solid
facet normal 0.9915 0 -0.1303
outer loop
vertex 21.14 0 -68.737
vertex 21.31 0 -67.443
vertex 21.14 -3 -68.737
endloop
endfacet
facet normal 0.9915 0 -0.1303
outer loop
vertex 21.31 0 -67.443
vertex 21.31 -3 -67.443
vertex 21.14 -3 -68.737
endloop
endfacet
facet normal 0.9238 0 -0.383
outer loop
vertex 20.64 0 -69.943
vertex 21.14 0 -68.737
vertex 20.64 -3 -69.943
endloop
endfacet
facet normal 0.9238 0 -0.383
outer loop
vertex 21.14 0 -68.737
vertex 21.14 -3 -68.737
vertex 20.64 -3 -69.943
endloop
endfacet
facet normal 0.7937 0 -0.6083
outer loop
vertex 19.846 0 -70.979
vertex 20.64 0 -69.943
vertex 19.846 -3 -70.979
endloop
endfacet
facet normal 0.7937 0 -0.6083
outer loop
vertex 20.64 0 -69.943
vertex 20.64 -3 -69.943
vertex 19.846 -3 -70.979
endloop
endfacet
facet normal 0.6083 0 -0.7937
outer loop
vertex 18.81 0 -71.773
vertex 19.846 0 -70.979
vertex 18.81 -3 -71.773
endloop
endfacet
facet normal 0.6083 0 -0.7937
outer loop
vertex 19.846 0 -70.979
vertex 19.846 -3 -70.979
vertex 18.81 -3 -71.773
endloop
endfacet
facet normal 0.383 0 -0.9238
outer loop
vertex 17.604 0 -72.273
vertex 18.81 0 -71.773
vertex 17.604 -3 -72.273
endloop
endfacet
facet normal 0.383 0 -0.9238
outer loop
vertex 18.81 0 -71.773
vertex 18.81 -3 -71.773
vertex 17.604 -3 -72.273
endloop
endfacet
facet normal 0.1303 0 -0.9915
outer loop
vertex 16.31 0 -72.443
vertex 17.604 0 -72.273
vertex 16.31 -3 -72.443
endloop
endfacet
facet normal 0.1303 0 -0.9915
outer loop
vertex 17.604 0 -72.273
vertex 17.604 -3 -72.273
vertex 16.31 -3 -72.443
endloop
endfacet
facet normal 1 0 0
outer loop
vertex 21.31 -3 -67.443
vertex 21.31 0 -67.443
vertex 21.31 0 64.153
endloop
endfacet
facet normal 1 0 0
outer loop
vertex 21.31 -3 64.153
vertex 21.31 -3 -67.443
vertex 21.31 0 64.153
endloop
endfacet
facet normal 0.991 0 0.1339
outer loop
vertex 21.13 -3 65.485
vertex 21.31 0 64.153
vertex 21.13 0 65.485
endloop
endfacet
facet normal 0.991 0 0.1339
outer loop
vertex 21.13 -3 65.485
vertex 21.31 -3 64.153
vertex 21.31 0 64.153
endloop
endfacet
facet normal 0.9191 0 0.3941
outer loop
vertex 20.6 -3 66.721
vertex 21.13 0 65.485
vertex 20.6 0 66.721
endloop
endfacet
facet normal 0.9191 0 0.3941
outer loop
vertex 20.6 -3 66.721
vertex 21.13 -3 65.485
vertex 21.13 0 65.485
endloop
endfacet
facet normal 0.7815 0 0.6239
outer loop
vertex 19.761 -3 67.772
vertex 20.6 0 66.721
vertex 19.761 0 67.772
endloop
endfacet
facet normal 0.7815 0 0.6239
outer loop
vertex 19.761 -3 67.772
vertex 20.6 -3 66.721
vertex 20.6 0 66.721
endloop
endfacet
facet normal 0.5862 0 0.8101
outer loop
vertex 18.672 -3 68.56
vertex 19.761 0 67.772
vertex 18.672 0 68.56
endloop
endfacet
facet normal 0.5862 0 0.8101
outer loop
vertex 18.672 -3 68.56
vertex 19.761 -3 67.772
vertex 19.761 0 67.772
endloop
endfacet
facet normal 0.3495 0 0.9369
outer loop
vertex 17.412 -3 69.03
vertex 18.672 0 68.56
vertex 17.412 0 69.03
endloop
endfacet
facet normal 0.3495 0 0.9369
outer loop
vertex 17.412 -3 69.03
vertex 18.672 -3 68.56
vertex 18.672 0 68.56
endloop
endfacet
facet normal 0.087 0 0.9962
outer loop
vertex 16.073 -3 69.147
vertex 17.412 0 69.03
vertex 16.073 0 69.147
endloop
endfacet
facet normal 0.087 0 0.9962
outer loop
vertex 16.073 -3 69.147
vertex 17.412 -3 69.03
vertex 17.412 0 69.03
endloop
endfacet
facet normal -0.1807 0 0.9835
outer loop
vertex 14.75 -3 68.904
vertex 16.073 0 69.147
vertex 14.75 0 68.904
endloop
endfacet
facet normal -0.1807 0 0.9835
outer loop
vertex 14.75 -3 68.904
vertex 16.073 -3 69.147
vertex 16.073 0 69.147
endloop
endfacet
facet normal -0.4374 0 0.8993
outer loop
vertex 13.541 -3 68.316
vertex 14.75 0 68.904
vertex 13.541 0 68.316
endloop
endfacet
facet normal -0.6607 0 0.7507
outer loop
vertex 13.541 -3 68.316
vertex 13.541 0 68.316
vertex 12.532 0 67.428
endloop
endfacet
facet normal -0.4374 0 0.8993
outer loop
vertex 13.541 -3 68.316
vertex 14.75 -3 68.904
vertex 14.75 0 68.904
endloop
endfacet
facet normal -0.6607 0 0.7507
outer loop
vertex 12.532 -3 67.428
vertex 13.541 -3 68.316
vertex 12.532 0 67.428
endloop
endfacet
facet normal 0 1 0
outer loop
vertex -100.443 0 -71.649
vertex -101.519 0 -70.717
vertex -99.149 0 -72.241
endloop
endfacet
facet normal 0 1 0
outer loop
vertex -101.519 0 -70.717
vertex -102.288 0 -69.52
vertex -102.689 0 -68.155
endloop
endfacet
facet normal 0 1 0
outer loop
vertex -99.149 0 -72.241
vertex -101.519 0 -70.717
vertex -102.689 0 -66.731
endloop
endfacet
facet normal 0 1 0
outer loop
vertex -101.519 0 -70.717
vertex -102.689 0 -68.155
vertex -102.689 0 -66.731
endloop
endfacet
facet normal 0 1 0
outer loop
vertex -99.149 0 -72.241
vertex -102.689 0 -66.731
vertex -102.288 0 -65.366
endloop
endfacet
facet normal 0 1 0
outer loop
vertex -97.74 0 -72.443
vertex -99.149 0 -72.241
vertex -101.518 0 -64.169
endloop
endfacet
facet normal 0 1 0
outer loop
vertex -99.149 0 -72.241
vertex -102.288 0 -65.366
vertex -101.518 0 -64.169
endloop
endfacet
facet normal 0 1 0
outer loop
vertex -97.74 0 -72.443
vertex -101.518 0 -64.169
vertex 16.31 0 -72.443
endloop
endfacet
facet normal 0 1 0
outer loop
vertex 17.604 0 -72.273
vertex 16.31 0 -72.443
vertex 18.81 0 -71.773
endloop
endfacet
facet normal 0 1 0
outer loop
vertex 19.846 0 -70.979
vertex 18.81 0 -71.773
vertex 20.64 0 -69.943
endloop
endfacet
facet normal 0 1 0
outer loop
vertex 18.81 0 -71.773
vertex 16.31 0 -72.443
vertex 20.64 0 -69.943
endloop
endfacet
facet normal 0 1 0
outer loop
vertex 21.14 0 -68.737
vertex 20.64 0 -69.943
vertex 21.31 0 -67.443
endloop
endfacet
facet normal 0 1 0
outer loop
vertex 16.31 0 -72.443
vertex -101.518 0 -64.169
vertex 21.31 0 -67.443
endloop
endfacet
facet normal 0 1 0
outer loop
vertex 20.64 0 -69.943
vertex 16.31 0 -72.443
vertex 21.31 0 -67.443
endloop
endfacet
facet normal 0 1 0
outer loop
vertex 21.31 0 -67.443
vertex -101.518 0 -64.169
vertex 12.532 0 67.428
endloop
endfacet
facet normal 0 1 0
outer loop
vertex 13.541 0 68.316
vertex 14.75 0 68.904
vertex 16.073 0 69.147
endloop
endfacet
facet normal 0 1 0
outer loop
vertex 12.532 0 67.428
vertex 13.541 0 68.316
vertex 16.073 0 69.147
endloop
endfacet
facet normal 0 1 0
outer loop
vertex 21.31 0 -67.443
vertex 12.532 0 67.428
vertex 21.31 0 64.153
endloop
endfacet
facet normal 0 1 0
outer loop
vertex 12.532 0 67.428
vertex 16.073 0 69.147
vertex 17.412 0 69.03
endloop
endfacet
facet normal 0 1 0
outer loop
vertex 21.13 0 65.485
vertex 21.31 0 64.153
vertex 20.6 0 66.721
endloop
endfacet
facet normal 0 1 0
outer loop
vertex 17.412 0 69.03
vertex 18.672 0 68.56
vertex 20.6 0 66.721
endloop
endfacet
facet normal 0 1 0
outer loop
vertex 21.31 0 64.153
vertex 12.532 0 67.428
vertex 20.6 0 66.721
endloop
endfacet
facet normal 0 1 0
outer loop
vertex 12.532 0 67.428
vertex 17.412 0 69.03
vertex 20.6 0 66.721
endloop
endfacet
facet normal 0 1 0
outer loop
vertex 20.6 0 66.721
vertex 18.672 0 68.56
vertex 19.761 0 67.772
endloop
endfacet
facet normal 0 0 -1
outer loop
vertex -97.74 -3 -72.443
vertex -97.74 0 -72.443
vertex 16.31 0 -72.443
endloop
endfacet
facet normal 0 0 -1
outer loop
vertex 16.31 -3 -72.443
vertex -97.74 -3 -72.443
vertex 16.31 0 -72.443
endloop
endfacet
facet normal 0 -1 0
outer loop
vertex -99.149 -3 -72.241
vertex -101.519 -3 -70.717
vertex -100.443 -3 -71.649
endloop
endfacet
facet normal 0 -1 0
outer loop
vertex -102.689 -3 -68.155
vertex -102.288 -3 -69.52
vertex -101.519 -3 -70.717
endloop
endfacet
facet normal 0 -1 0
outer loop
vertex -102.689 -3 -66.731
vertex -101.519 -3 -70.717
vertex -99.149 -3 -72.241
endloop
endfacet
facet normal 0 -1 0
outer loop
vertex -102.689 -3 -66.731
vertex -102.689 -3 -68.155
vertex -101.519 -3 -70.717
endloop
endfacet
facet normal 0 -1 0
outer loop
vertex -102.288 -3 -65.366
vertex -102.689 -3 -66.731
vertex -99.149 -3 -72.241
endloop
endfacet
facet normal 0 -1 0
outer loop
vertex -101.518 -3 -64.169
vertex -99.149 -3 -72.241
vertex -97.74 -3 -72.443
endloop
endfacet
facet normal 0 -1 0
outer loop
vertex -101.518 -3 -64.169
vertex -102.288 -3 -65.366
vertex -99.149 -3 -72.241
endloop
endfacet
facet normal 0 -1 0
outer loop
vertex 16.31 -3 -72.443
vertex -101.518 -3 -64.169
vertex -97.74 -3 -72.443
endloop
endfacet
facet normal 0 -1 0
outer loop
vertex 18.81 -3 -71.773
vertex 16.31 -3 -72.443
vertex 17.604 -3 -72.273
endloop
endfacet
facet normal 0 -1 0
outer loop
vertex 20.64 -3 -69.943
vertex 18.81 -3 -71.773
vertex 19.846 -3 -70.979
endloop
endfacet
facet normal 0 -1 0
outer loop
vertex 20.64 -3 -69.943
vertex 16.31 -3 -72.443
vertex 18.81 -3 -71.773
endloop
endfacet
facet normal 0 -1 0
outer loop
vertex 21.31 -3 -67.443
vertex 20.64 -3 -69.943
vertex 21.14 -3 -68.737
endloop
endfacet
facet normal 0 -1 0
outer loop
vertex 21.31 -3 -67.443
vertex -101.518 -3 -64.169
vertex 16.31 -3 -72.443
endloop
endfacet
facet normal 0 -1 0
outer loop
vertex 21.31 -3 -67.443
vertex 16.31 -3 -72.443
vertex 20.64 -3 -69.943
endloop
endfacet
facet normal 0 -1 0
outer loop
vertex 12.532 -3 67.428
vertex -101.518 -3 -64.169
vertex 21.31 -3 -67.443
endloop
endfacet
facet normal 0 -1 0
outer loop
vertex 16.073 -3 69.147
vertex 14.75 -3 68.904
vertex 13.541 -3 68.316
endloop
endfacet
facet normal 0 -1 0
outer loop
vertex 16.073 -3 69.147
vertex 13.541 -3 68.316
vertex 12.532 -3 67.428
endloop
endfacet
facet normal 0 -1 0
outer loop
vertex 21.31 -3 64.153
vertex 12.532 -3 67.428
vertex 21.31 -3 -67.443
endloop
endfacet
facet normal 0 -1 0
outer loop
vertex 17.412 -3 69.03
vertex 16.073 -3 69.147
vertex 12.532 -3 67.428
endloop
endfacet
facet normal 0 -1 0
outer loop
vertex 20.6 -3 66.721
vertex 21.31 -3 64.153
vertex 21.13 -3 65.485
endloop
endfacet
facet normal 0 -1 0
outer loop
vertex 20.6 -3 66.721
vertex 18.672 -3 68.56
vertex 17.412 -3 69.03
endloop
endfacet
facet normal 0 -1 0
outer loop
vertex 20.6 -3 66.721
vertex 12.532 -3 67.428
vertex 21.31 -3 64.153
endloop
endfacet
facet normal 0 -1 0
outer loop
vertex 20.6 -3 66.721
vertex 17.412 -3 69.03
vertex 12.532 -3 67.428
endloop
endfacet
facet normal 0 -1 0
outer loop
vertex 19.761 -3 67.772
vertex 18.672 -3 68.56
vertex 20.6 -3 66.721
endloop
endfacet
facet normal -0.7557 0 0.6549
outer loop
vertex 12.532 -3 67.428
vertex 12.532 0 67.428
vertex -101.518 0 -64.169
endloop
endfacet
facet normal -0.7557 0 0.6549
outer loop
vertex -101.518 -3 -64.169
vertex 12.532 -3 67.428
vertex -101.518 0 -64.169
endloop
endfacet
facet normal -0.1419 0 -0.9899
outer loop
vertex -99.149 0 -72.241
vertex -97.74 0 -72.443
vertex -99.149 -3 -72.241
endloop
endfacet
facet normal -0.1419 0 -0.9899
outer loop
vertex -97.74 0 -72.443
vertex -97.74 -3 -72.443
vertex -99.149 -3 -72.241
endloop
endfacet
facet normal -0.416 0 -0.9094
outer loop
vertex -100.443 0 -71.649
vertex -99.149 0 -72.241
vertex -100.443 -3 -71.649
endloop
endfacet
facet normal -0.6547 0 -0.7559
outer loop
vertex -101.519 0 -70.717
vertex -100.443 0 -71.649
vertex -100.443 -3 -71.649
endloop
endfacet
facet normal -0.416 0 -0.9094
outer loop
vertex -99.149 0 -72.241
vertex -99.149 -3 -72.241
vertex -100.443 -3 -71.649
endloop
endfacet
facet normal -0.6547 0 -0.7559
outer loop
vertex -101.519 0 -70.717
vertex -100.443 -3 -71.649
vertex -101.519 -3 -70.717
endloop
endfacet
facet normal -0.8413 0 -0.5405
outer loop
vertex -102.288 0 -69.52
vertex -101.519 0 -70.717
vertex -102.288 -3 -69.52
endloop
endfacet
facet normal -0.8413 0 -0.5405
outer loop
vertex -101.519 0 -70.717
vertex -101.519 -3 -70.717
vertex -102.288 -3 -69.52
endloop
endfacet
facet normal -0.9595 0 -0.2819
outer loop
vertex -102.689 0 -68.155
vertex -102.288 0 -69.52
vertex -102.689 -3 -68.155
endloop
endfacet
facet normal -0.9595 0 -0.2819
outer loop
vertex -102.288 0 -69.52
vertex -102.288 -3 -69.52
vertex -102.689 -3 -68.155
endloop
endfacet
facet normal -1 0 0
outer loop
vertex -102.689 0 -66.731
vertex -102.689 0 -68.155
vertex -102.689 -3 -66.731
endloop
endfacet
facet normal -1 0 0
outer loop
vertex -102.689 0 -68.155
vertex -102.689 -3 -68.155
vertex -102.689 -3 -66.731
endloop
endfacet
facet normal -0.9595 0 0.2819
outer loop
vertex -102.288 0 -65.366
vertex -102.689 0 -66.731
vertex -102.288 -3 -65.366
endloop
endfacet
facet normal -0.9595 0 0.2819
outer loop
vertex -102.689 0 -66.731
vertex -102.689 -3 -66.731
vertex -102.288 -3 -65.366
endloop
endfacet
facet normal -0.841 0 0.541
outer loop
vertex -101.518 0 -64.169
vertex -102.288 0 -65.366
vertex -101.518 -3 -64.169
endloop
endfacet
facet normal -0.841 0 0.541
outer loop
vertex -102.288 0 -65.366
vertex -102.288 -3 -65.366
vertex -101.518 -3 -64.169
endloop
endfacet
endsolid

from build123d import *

# Parameters (mm, degrees)
F1_DEPTH = 3
F2_R     = 5
F3_R     = 5
F4_R     = 5


with BuildPart() as f1:
    # F0 (on Front) → F1 (new body)
    with BuildSketch(Plane.XZ):
        Polygon((21.310295, -72.443289), (21.310295, 77.556711), (-108.689705, -72.443289), align=None)
    extrude(amount=F1_DEPTH)

    # F2
    f2_edges = [f1.edges().sort_by_distance(p)[0] for p in [
        (21.310295, -1.5, 77.556711),
    ]]
    fillet(f2_edges, radius=F2_R)

    # F3
    f3_edges = [f1.edges().sort_by_distance(p)[0] for p in [
        (21.310295, -1.5, -72.443289),
    ]]
    fillet(f3_edges, radius=F3_R)

    # F4
    f4_edges = [f1.edges().sort_by_distance(p)[0] for p in [
        (-108.689705, -1.5, -72.443289),
    ]]
    fillet(f4_edges, radius=F4_R)


solid = f1.part
